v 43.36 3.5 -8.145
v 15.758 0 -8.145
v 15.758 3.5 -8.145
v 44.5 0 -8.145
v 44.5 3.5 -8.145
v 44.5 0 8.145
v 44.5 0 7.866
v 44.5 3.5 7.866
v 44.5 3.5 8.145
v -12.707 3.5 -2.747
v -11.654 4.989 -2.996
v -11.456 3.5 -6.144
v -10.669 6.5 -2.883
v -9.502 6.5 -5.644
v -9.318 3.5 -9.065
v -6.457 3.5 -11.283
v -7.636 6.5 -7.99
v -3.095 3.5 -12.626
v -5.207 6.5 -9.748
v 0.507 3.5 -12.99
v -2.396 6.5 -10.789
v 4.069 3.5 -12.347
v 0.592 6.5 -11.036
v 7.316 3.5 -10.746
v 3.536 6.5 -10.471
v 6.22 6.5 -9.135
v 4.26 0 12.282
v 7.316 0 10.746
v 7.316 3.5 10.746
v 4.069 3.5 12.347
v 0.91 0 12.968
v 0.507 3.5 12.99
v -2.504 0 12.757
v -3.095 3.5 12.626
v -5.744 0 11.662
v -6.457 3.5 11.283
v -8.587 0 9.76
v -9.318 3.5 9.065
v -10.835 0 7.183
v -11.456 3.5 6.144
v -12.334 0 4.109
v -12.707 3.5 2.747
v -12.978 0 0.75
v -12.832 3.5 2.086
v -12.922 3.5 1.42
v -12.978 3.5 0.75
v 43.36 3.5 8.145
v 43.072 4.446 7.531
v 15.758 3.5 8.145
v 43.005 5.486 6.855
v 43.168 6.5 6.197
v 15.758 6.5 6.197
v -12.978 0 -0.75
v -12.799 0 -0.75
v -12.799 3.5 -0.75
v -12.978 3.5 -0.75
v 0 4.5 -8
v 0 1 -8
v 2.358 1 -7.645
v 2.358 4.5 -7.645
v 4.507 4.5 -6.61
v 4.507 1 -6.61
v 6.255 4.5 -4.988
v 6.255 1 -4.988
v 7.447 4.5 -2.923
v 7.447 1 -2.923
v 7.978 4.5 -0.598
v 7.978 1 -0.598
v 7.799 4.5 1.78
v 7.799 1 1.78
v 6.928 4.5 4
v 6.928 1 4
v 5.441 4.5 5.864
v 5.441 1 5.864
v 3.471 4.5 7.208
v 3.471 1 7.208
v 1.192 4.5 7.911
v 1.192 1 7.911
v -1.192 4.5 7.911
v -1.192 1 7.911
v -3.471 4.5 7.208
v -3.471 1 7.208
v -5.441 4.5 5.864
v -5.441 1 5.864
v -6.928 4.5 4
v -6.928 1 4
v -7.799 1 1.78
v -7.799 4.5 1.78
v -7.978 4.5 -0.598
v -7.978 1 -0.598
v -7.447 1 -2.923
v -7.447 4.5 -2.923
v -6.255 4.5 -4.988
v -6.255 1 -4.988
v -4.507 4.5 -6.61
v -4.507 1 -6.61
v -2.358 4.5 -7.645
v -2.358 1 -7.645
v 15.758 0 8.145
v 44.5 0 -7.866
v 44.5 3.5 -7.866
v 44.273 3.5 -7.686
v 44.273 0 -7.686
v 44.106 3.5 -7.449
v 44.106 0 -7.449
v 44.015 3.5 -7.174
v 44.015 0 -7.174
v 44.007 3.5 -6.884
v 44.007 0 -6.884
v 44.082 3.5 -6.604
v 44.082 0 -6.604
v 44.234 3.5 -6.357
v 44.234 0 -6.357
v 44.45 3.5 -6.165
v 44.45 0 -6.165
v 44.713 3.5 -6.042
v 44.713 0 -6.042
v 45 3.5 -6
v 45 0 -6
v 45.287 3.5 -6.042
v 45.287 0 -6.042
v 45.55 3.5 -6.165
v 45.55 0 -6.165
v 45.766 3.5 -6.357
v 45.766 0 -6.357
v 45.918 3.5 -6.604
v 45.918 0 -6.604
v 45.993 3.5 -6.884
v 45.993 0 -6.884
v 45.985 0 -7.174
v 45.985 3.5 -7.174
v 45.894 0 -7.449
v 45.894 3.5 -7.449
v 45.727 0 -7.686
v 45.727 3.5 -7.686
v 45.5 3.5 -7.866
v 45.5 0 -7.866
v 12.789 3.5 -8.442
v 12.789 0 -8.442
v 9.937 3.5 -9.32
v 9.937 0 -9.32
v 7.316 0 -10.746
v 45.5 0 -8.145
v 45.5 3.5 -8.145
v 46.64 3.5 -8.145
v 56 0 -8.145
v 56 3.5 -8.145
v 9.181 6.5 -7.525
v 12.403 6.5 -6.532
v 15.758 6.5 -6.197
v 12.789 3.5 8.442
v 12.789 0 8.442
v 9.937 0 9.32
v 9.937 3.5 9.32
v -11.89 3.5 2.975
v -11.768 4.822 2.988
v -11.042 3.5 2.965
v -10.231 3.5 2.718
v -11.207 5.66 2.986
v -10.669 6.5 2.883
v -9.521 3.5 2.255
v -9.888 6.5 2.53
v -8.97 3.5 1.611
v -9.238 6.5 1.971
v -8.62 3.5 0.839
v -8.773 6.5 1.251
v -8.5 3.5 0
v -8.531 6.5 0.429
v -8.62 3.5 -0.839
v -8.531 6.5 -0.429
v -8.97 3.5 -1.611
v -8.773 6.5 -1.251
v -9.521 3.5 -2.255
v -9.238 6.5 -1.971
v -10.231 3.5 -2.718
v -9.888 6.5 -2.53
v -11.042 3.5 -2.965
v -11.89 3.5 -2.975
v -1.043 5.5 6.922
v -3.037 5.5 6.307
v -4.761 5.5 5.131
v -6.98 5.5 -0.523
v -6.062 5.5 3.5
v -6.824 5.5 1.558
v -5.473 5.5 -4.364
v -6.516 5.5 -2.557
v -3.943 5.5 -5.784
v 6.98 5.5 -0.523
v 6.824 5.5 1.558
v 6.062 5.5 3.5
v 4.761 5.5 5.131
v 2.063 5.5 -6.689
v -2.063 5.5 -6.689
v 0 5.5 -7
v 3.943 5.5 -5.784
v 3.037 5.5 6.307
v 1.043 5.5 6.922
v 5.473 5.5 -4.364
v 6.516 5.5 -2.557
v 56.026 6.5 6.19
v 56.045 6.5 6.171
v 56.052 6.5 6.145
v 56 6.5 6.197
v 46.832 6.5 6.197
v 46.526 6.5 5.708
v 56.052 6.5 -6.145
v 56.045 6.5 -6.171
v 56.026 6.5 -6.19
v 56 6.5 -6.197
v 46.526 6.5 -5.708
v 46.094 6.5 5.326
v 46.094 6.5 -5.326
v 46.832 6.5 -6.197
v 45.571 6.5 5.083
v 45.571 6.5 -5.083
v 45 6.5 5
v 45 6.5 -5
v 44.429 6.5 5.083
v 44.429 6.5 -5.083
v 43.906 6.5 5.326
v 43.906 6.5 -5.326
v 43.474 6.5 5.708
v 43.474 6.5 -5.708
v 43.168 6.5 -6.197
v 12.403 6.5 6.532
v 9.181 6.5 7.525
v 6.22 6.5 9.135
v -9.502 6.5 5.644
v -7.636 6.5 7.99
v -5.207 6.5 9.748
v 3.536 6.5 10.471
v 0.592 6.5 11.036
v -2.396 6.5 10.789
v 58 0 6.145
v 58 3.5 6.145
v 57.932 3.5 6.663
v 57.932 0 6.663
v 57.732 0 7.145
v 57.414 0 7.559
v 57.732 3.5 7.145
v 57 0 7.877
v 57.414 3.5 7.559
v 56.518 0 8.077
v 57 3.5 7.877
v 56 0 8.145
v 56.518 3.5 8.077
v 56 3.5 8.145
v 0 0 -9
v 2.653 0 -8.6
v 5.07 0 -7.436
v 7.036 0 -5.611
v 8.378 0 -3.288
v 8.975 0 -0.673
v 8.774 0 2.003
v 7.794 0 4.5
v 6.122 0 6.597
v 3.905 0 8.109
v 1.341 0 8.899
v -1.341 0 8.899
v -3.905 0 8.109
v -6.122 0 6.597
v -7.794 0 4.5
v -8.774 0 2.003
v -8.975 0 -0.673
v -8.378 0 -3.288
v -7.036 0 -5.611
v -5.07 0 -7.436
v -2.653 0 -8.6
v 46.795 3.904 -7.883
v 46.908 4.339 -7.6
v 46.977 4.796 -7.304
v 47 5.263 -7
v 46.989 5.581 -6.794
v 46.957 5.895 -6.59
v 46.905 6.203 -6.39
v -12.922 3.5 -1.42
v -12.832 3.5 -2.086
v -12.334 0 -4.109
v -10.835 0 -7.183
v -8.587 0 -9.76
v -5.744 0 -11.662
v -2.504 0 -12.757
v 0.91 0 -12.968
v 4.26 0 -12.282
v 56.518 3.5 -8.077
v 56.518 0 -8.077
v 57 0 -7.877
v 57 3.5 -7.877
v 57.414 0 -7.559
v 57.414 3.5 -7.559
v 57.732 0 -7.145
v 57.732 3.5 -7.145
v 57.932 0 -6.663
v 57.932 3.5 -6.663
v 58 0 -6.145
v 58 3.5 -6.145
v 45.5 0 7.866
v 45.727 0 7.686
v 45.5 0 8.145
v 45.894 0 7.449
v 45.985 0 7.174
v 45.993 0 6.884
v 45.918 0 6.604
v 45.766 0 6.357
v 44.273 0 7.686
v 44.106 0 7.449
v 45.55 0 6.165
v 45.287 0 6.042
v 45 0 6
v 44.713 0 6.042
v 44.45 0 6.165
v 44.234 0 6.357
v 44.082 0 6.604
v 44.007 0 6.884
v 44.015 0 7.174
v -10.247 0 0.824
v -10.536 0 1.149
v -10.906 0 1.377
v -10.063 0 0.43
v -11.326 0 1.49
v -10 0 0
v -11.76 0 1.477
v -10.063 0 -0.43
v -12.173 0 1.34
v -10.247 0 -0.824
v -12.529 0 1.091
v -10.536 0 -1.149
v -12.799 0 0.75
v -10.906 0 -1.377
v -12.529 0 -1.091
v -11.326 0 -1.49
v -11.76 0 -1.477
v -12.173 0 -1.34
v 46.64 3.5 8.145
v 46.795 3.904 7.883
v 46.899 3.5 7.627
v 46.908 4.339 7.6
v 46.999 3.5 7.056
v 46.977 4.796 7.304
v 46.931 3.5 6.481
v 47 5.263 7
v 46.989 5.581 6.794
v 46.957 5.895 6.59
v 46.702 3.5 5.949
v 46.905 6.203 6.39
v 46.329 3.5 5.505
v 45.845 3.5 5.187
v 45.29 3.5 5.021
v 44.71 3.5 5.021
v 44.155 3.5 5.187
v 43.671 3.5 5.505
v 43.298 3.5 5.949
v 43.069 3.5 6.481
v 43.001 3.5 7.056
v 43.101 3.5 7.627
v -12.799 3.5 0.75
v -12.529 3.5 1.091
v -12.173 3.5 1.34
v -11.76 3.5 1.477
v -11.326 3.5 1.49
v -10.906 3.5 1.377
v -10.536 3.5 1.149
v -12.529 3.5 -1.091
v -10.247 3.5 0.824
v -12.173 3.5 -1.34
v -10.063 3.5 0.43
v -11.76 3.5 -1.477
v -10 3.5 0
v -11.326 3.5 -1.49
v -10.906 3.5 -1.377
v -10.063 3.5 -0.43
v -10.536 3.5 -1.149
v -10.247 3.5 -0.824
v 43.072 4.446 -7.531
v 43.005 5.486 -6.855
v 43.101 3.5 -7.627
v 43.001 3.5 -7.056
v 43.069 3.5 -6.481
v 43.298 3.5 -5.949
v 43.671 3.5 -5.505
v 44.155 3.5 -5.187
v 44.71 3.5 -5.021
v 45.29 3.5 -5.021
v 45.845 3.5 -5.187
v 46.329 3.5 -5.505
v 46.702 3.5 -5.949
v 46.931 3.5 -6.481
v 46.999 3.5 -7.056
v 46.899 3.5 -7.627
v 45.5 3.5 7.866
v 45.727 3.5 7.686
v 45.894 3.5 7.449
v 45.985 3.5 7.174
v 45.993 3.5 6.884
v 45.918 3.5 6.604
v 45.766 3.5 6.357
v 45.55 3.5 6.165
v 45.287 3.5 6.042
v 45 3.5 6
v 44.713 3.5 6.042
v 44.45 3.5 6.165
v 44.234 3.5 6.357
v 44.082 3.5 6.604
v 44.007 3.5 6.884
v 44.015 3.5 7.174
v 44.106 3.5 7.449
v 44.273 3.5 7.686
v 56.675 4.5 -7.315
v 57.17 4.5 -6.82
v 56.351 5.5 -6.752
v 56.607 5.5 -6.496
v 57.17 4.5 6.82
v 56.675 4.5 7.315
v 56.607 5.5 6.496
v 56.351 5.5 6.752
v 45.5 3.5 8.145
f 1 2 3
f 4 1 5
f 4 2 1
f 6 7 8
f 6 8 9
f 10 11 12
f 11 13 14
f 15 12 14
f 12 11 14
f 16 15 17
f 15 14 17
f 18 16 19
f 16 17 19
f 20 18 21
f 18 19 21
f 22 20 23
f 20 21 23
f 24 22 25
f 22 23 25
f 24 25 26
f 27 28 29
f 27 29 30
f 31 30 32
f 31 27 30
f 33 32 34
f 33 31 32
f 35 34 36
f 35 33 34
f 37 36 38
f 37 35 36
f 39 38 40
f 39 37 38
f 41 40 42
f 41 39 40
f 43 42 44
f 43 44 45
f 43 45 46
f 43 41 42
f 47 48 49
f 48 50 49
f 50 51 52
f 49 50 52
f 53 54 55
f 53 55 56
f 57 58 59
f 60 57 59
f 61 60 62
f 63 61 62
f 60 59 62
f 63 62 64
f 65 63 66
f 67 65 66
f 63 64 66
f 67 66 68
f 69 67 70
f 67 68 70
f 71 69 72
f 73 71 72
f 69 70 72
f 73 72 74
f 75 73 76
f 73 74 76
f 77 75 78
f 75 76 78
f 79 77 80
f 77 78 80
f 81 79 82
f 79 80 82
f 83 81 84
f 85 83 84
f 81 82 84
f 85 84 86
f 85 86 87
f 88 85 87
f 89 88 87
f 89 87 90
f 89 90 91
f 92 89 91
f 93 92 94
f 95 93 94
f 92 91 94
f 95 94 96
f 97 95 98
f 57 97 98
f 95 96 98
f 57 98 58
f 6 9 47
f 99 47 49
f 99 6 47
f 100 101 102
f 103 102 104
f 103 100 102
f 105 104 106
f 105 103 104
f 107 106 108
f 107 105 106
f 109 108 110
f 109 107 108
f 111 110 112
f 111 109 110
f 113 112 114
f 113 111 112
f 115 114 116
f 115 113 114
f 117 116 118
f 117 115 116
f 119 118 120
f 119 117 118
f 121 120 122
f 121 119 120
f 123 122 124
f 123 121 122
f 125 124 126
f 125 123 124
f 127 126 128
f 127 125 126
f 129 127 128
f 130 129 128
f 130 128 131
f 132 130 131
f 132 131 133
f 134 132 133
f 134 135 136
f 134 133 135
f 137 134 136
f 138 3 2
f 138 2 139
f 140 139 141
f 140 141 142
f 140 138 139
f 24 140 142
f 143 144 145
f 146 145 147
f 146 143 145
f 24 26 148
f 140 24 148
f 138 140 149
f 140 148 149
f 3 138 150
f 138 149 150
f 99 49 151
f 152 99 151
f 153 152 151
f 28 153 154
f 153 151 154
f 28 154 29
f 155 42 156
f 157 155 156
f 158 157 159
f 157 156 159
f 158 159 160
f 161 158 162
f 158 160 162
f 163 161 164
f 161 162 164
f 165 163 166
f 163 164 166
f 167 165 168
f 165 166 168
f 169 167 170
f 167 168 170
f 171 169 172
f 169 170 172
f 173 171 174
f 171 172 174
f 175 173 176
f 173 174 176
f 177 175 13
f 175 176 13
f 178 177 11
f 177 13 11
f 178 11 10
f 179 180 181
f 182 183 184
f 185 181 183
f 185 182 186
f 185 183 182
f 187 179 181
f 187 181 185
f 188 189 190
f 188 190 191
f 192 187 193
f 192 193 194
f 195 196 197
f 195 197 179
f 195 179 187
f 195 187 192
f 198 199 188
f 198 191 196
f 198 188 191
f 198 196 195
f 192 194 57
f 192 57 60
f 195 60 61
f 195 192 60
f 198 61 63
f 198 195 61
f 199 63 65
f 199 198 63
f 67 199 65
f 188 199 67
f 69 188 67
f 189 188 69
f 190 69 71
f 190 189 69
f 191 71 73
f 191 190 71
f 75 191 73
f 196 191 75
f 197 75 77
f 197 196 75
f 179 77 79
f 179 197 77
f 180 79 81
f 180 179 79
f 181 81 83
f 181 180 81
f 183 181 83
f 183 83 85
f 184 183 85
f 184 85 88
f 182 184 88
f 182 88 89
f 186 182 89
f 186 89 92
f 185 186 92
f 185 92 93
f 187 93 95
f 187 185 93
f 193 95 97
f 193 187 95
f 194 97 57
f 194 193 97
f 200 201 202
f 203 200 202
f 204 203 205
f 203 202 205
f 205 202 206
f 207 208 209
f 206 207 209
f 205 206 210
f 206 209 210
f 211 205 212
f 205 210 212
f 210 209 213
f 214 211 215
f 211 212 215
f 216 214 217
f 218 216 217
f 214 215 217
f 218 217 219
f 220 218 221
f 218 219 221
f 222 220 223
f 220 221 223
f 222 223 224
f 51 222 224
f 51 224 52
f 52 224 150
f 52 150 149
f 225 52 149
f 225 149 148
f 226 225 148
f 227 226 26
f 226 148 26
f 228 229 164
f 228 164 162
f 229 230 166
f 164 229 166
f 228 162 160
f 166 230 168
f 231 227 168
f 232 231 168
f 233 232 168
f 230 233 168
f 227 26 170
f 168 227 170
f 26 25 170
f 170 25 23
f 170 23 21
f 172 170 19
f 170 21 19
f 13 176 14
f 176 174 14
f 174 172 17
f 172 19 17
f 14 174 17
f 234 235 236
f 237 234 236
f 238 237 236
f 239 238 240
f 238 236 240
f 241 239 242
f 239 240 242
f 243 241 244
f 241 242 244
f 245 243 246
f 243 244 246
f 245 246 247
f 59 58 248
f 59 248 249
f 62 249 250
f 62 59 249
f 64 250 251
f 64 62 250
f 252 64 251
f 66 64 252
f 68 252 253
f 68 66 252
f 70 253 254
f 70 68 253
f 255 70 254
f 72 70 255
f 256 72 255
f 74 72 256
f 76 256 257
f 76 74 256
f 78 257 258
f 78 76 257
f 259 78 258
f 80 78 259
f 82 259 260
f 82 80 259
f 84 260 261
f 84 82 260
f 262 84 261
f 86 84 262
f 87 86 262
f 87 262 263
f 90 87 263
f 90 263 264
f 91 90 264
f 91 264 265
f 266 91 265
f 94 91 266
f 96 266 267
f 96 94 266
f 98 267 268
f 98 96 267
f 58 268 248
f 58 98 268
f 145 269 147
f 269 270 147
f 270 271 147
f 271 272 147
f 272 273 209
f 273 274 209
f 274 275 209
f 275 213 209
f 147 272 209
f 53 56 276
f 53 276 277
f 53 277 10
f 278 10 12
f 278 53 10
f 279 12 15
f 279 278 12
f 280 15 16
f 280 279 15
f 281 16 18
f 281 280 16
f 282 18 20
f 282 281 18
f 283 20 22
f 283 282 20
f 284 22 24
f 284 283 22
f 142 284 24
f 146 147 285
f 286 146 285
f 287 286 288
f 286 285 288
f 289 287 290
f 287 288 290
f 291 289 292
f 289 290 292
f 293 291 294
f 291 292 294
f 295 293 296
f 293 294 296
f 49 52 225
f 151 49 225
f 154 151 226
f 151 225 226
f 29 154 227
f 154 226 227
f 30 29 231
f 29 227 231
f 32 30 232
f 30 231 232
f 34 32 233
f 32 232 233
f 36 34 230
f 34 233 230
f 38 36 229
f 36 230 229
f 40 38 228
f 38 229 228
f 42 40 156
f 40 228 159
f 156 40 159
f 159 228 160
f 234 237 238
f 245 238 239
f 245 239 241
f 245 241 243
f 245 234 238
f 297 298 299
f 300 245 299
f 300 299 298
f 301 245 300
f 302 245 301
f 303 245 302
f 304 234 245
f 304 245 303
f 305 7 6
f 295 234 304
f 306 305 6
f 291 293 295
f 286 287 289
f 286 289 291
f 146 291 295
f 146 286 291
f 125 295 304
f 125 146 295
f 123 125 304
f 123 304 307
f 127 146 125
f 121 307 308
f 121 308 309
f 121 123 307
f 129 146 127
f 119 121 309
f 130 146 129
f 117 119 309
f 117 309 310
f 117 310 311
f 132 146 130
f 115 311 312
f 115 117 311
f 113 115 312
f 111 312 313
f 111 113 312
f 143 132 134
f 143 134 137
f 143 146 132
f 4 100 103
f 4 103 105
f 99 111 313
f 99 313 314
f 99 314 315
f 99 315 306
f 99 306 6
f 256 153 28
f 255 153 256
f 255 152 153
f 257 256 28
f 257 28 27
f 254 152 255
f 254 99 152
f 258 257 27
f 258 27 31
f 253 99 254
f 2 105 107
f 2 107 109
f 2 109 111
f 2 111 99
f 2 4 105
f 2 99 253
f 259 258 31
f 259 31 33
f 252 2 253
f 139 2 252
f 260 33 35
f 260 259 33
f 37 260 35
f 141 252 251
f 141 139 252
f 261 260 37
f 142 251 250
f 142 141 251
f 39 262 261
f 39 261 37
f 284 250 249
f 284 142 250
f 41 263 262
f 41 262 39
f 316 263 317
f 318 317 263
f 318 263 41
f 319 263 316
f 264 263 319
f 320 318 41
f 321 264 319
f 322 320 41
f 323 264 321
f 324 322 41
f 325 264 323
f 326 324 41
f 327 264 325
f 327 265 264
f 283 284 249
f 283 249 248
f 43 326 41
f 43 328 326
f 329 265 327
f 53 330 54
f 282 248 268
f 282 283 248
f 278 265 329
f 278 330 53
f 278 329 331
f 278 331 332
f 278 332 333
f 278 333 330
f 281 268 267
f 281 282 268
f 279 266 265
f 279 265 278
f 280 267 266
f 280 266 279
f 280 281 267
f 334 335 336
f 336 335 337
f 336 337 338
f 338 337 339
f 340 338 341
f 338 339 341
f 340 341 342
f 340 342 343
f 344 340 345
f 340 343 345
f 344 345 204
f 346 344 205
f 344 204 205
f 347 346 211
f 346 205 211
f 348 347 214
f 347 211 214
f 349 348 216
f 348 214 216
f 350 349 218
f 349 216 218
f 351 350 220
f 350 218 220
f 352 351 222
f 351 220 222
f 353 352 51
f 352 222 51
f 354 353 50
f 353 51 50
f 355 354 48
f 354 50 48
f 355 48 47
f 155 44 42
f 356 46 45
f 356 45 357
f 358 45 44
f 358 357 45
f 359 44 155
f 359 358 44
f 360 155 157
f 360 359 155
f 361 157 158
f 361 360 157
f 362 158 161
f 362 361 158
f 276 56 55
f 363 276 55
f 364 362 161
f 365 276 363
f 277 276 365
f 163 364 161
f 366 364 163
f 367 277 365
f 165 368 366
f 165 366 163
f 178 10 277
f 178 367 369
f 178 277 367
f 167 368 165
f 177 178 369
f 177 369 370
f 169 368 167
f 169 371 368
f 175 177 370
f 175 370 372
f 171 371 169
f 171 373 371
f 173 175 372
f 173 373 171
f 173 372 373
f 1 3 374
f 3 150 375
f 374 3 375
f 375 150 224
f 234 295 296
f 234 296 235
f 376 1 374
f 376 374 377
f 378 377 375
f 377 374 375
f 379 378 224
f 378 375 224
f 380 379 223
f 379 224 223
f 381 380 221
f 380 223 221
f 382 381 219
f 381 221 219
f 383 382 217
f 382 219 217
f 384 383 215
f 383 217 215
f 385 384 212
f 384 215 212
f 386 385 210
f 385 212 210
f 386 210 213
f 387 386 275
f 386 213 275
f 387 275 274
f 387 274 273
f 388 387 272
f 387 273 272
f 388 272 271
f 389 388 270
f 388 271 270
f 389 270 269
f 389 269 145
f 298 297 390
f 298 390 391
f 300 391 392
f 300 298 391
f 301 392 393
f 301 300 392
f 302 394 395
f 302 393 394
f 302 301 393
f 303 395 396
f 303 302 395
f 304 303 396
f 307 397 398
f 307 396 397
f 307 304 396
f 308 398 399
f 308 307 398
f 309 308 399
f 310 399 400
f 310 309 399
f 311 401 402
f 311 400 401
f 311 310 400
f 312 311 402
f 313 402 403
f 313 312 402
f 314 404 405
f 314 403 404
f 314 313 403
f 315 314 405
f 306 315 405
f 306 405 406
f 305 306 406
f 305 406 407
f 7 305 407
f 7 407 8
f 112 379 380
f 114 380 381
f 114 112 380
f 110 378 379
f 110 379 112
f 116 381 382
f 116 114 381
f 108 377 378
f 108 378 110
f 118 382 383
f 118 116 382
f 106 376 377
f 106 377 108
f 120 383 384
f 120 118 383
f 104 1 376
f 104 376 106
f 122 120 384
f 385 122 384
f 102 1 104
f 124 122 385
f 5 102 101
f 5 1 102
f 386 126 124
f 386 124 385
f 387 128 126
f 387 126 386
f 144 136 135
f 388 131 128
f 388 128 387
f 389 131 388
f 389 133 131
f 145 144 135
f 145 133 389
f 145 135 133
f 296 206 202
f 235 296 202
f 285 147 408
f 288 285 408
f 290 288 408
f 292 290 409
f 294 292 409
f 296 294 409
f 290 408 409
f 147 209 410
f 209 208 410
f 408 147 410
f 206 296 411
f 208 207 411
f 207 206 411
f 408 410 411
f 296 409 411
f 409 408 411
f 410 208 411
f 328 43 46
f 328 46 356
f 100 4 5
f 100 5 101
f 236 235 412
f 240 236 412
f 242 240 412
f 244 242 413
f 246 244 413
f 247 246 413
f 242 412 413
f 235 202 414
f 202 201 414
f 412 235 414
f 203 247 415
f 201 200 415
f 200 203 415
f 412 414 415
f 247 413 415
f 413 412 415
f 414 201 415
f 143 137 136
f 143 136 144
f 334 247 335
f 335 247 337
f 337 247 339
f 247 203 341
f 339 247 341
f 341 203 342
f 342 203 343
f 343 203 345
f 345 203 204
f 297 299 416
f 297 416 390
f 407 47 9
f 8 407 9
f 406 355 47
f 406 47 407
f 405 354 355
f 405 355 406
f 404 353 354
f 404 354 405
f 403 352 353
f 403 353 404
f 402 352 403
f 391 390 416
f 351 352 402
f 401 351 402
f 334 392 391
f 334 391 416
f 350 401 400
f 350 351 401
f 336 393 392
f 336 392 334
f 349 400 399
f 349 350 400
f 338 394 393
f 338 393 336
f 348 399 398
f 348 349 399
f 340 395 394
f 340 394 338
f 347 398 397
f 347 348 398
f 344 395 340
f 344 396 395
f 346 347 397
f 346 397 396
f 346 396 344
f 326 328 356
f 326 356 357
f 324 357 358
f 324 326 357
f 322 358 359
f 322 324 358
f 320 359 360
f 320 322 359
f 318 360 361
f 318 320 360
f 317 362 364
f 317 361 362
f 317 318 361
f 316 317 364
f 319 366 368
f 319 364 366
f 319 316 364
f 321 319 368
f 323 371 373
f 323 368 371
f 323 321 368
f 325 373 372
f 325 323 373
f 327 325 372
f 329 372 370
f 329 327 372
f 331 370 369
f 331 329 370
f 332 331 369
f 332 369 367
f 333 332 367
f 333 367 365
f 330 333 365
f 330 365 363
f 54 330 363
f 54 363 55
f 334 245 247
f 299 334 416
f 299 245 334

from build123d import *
from OCP.BRepFilletAPI import BRepFilletAPI_MakeChamfer

# Parameters (mm, degrees)
BOSS_EXTRUDE1_DEPTH = 6.5
SKETCH3_R           = 8
CUT_EXTRUDE2_DEPTH  = 5.5
CHAMFER4_SIZE       = 1
FILLET3_R           = 2
FILLET4_R           = 15
CHAMFER7_SIZE       = 3
CHAMFER7_SIZE2      = 1.94822278
SKETCH4_R           = 2
SKETCH4_R_2         = 3
CUT_EXTRUDE7_DEPTH  = 3


with BuildPart() as part:
    # Sketch1 → Boss-Extrude1 (new body)
    with BuildSketch(Plane(origin=(0, 0, 0), x_dir=(1, 0, 0), z_dir=(0, 1, 0))):
        with BuildLine():
            Line((10.132076539, 8.145), (44.5, 8.145))
            Line((44.5, 8.145), (44.5, 7.866025404))
            ThreePointArc((44.5, 7.866025404), (45, 6), (45.5, 7.866025404))
            Line((45.5, 7.866025404), (45.5, 8.145))
            Line((45.5, 8.145), (58, 8.145))
            Line((58, 8.145), (58, -8.145))
            Line((58, -8.145), (45.5, -8.145))
            Line((45.5, -8.145), (45.5, -7.866025404))
            ThreePointArc((45.5, -7.866025404), (45, -6), (44.5, -7.866025404))
            Line((44.5, -7.866025404), (44.5, -8.145))
            Line((44.5, -8.145), (10.132076539, -8.145))
            ThreePointArc((10.132076539, -8.145), (-3.961921331, -12.381566111), (-12.978347352, -0.75))
            Line((-12.978347352, -0.75), (-12.799038106, -0.75))
            ThreePointArc((-12.799038106, -0.75), (-10, 0), (-12.799038106, 0.75))
            Line((-12.799038106, 0.75), (-12.978347352, 0.75))
            ThreePointArc((-12.978347352, 0.75), (-3.961921331, 12.381566111), (10.132076539, 8.145))
        make_face()
    extrude(amount=BOSS_EXTRUDE1_DEPTH)

    # Sketch3 → Cut-Extrude2 (cut)
    with BuildSketch(Plane.XZ):
        with Locations(Location((0, 0, 0), (0, 0, 270))):
            Circle(SKETCH3_R)
    extrude(amount=-CUT_EXTRUDE2_DEPTH, mode=Mode.SUBTRACT)

    # Chamfer4
    chamfer4_edges = [part.edges().sort_by_distance(p)[0] for p in [
        (0, 5.5, 8),
        (0, 0, 8),
    ]]
    chamfer(chamfer4_edges, length=CHAMFER4_SIZE)

    # Fillet3
    fillet3_edges = [part.edges().sort_by_distance(p)[0] for p in [
        (58, 3.25, -8.145),
        (58, 3.25, 8.145),
    ]]
    fillet(fillet3_edges, radius=FILLET3_R)

    # Fillet4
    fillet4_edges = [part.edges().sort_by_distance(p)[0] for p in [
        (10.132076539, 3.25, -8.145),
        (10.132076539, 3.25, 8.145),
    ]]
    fillet(fillet4_edges, radius=FILLET4_R)

    # Chamfer7: one chamfer whose edges measure the first distance from different faces: ONE call of the kernel's chamfer builder (chamfer() names one face for all edges)
    chamfer7_edges_1 = [part.edges().sort_by_distance(p)[0] for p in [
        (-5.74409604, 6.5, -11.662133625),
    ]]
    chamfer7_side_1 = [part.faces().sort_by_distance(p)[0] for p in [
        (-5.74409604, 3.25, -11.662133625),
    ]]
    chamfer7_edges_2 = [part.edges().sort_by_distance(p)[0] for p in [
        (11.341184071, 6.5, -8.80996238),
    ]]
    chamfer7_side_2 = [part.faces().sort_by_distance(p)[0] for p in [
        (11.341184071, 3.25, -8.80996238),
    ]]
    chamfer7_edges_3 = [part.edges().sort_by_distance(p)[0] for p in [
        (30.12891133, 6.5, -8.145),
    ]]
    chamfer7_side_3 = [part.faces().sort_by_distance(p)[0] for p in [
        (30.12891133, 3.25, -8.145),
    ]]
    chamfer7_edges_4 = [part.edges().sort_by_distance(p)[0] for p in [
        (50.75, 6.5, -8.145),
    ]]
    chamfer7_side_4 = [part.faces().sort_by_distance(p)[0] for p in [
        (50.75, 3.25, -8.145),
    ]]
    chamfer7_edges_5 = [part.edges().sort_by_distance(p)[0] for p in [
        (57.414213562, 6.5, -7.559213562),
    ]]
    chamfer7_side_5 = [part.faces().sort_by_distance(p)[0] for p in [
        (57.414213562, 3.25, -7.559213562),
    ]]
    chamfer7_edges_6 = [part.edges().sort_by_distance(p)[0] for p in [
        (58, 6.5, 0),
    ]]
    chamfer7_side_6 = [part.faces().sort_by_distance(p)[0] for p in [
        (58, 3.25, 0),
    ]]
    chamfer7_edges_7 = [part.edges().sort_by_distance(p)[0] for p in [
        (57.414213562, 6.5, 7.559213562),
    ]]
    chamfer7_side_7 = [part.faces().sort_by_distance(p)[0] for p in [
        (57.414213562, 3.25, 7.559213562),
    ]]
    chamfer7_edges_8 = [part.edges().sort_by_distance(p)[0] for p in [
        (50.75, 6.5, 8.145),
    ]]
    chamfer7_side_8 = [part.faces().sort_by_distance(p)[0] for p in [
        (50.75, 3.25, 8.145),
    ]]
    chamfer7_edges_9 = [part.edges().sort_by_distance(p)[0] for p in [
        (30.12891133, 6.5, 8.145),
    ]]
    chamfer7_side_9 = [part.faces().sort_by_distance(p)[0] for p in [
        (30.12891133, 3.25, 8.145),
    ]]
    chamfer7_edges_10 = [part.edges().sort_by_distance(p)[0] for p in [
        (11.341184071, 6.5, 8.80996238),
    ]]
    chamfer7_side_10 = [part.faces().sort_by_distance(p)[0] for p in [
        (11.341184071, 3.25, 8.80996238),
    ]]
    chamfer7_edges_11 = [part.edges().sort_by_distance(p)[0] for p in [
        (-5.74409604, 6.5, 11.662133625),
    ]]
    chamfer7_side_11 = [part.faces().sort_by_distance(p)[0] for p in [
        (-5.74409604, 3.25, 11.662133625),
    ]]
    chamfer7 = BRepFilletAPI_MakeChamfer(part.part.solid().wrapped)
    for e in chamfer7_edges_1:
        chamfer7.Add(CHAMFER7_SIZE, CHAMFER7_SIZE2, e.wrapped, chamfer7_side_1[0].wrapped)  # the first distance lies on this face
    for e in chamfer7_edges_2:
        chamfer7.Add(CHAMFER7_SIZE, CHAMFER7_SIZE2, e.wrapped, chamfer7_side_2[0].wrapped)  # the first distance lies on this face
    for e in chamfer7_edges_3:
        chamfer7.Add(CHAMFER7_SIZE, CHAMFER7_SIZE2, e.wrapped, chamfer7_side_3[0].wrapped)  # the first distance lies on this face
    for e in chamfer7_edges_4:
        chamfer7.Add(CHAMFER7_SIZE, CHAMFER7_SIZE2, e.wrapped, chamfer7_side_4[0].wrapped)  # the first distance lies on this face
    for e in chamfer7_edges_5:
        chamfer7.Add(CHAMFER7_SIZE, CHAMFER7_SIZE2, e.wrapped, chamfer7_side_5[0].wrapped)  # the first distance lies on this face
    for e in chamfer7_edges_6:
        chamfer7.Add(CHAMFER7_SIZE, CHAMFER7_SIZE2, e.wrapped, chamfer7_side_6[0].wrapped)  # the first distance lies on this face
    for e in chamfer7_edges_7:
        chamfer7.Add(CHAMFER7_SIZE, CHAMFER7_SIZE2, e.wrapped, chamfer7_side_7[0].wrapped)  # the first distance lies on this face
    for e in chamfer7_edges_8:
        chamfer7.Add(CHAMFER7_SIZE, CHAMFER7_SIZE2, e.wrapped, chamfer7_side_8[0].wrapped)  # the first distance lies on this face
    for e in chamfer7_edges_9:
        chamfer7.Add(CHAMFER7_SIZE, CHAMFER7_SIZE2, e.wrapped, chamfer7_side_9[0].wrapped)  # the first distance lies on this face
    for e in chamfer7_edges_10:
        chamfer7.Add(CHAMFER7_SIZE, CHAMFER7_SIZE2, e.wrapped, chamfer7_side_10[0].wrapped)  # the first distance lies on this face
    for e in chamfer7_edges_11:
        chamfer7.Add(CHAMFER7_SIZE, CHAMFER7_SIZE2, e.wrapped, chamfer7_side_11[0].wrapped)  # the first distance lies on this face
    add(Compound.cast(chamfer7.Shape()), mode=Mode.REPLACE)

    # Sketch4 → Cut-Extrude7 (cut)
    with BuildSketch(Plane(origin=(0, 6.5, 0), x_dir=(1, 0, 0), z_dir=(0, 1, 0))):
        with Locations((45, 7)):
            Circle(SKETCH4_R)
        with Locations((45, -7)):
            Circle(SKETCH4_R)
        with Locations((-11.5, 0)):
            Circle(SKETCH4_R_2)
    extrude(amount=-CUT_EXTRUDE7_DEPTH, mode=Mode.SUBTRACT)


solid = part.part
